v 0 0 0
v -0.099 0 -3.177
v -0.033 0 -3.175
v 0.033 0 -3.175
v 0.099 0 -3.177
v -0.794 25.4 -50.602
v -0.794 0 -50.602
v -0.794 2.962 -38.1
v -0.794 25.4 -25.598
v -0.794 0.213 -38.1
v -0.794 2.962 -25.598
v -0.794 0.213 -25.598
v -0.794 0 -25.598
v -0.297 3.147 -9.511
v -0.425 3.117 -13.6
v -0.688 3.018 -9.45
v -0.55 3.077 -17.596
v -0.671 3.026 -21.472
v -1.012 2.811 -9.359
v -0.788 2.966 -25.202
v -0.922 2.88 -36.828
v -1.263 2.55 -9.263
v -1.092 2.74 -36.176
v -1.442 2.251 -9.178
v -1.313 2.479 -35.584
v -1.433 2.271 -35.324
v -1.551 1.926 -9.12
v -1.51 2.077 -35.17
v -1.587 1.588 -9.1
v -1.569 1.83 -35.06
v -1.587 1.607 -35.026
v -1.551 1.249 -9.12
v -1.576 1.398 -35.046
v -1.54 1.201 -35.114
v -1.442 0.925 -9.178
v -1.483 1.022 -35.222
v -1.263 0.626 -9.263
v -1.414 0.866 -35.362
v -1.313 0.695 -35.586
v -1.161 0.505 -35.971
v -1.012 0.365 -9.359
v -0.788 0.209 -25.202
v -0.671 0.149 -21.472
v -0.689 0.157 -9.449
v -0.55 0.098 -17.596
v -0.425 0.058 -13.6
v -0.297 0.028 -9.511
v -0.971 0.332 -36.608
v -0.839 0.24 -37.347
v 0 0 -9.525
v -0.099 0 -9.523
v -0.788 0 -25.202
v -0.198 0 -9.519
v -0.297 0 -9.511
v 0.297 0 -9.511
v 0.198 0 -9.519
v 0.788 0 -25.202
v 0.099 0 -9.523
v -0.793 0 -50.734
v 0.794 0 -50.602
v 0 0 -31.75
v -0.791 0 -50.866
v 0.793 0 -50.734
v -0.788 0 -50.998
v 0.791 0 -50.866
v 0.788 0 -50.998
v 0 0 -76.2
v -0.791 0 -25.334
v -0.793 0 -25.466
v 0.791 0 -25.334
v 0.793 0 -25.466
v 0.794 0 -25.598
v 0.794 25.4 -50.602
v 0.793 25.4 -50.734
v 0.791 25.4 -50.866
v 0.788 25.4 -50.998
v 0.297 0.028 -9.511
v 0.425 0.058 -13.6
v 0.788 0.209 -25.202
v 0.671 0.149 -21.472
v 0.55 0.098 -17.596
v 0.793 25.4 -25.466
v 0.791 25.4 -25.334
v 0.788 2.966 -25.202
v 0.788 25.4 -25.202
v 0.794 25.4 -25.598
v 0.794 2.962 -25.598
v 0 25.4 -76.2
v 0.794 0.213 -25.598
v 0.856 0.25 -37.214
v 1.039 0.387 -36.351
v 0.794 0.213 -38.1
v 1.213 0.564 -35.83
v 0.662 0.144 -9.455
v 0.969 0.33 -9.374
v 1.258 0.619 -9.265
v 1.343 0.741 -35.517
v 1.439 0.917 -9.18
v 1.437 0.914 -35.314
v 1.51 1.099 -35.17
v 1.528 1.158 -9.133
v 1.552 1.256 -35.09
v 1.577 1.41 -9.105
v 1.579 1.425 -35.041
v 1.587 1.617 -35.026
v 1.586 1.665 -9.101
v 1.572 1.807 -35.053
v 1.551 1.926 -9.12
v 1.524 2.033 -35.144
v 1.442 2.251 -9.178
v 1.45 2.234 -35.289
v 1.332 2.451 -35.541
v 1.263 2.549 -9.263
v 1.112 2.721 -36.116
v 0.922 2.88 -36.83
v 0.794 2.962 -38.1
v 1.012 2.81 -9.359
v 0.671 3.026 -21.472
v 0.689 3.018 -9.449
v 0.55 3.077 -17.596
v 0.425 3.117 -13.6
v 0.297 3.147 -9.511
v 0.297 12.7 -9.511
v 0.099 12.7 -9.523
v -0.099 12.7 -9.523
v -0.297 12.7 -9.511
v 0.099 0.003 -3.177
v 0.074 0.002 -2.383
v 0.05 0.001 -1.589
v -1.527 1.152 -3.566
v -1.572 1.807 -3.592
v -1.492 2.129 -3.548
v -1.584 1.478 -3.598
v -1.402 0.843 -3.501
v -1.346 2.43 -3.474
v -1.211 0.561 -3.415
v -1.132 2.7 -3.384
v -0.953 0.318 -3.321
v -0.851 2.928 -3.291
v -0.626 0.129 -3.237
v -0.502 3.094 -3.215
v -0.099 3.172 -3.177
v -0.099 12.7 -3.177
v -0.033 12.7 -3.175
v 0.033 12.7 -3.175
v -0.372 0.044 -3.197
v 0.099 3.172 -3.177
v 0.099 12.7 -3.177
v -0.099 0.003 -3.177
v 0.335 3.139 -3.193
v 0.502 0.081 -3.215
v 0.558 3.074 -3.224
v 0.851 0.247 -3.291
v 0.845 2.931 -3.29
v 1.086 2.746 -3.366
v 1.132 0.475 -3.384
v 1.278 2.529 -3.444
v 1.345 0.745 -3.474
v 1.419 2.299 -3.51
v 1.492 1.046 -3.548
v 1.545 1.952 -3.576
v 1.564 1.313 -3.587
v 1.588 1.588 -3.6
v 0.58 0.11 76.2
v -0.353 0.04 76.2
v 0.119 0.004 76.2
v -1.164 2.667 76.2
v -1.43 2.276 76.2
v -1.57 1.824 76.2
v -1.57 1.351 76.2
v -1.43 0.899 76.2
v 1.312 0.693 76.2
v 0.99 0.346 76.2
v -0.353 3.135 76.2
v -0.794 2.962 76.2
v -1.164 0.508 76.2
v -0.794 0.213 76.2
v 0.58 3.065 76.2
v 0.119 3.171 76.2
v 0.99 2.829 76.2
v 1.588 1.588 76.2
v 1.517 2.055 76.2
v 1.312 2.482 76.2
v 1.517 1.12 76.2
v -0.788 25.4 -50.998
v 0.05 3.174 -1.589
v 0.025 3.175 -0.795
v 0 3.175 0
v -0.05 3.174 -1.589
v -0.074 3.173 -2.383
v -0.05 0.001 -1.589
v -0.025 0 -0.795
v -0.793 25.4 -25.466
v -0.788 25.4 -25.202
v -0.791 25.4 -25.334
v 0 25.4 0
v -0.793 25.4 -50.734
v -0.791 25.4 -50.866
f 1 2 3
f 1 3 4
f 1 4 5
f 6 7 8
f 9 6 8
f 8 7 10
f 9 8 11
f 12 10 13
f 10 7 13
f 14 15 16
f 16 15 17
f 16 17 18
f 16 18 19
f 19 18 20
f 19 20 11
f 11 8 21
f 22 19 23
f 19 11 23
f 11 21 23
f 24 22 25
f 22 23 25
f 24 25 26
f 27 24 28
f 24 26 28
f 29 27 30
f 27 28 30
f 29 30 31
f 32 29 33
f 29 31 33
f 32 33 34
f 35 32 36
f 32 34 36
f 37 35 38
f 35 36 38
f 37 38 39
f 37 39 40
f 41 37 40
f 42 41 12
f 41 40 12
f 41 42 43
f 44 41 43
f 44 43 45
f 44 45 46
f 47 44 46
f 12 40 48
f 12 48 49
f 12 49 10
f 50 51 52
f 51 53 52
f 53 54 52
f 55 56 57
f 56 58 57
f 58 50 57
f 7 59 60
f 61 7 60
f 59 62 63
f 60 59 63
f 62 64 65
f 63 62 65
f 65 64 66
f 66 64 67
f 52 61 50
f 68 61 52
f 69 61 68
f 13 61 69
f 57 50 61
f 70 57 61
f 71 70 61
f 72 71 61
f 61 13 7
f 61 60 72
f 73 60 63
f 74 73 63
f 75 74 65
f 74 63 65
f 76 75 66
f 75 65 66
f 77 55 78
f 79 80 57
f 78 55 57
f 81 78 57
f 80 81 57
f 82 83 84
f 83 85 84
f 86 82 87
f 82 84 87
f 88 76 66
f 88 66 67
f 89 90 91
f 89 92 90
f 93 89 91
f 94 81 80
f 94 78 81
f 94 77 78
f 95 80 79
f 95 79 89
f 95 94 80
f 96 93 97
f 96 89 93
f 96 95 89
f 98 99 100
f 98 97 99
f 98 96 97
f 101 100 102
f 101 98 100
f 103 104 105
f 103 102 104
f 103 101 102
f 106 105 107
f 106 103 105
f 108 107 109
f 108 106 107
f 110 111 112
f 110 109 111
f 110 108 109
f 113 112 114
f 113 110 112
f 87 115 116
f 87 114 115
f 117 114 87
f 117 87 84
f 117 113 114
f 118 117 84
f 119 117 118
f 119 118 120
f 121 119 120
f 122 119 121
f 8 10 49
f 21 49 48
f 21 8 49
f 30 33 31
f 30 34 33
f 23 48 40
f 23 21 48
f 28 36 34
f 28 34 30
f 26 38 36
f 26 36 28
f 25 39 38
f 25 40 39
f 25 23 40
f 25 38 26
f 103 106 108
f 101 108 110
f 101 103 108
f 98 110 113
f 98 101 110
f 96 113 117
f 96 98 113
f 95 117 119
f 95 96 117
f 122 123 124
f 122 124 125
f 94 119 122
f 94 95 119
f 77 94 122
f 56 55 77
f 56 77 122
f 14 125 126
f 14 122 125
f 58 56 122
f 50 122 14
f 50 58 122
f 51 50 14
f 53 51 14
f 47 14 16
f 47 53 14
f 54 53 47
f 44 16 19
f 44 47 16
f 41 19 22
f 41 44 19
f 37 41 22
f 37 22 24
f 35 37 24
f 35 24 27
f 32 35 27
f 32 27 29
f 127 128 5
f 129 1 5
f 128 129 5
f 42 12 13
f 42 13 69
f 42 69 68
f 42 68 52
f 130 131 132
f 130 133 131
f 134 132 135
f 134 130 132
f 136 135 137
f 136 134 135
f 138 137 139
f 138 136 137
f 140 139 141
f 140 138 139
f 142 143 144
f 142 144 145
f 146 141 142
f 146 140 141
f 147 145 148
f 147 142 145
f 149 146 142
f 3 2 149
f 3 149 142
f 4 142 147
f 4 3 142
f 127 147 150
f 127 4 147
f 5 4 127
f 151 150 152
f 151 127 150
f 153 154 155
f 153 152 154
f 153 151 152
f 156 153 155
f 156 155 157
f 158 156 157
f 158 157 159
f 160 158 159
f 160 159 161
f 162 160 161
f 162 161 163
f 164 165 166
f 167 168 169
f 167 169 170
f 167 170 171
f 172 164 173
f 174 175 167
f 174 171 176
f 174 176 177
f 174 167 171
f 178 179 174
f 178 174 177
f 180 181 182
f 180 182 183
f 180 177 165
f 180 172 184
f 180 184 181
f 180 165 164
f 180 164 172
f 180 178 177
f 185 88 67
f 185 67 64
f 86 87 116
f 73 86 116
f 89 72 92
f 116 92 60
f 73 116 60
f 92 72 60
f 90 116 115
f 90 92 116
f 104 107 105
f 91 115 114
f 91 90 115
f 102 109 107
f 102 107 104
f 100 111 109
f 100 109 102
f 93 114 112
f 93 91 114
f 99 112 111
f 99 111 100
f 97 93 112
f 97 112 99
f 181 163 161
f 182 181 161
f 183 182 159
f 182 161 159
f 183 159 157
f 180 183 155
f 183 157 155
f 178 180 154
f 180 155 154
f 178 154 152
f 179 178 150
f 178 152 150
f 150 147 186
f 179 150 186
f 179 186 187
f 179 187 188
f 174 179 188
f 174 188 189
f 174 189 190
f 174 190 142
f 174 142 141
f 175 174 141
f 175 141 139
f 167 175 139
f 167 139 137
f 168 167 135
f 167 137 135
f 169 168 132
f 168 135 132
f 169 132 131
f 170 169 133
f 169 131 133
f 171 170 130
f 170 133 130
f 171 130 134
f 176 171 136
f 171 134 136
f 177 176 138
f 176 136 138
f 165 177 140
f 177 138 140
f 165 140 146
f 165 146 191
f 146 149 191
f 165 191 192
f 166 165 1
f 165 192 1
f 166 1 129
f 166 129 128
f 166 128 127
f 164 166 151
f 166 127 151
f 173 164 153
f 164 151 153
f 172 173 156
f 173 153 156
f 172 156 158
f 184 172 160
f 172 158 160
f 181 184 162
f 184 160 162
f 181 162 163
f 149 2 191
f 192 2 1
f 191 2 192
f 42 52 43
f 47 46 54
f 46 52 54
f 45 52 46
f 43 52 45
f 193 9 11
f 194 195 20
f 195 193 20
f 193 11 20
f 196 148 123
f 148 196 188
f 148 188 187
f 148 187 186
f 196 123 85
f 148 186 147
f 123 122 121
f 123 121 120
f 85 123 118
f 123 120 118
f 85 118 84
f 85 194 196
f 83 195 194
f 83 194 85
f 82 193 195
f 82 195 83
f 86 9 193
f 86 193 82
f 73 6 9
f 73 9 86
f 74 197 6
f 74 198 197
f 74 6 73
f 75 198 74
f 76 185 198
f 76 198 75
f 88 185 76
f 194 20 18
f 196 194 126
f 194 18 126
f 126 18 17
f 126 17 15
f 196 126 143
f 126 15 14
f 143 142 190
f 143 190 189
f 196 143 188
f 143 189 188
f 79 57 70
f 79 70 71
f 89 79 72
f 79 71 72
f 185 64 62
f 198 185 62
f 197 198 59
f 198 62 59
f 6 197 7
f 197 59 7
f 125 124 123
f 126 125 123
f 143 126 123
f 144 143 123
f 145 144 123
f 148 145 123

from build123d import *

# Parameters (mm, degrees)
BOSS_EXTRUDE1_DEPTH      = 25.4
FILLET1_R                = 12.7
BOSS_EXTRUDE2_DEPTH      = 76.2
BOSS_EXTRUDE2_DEPTH_BACK = 31.75
SKETCH3_R                = 1.5875
FILLET2_R                = 6.35
SKETCH4_R                = 3.175
CUT_EXTRUDE2_DEPTH       = 12.7


with BuildPart() as part:
    # Sketch1 → Boss-Extrude1 (new body)
    with BuildSketch(Plane(origin=(0, 0, 0), x_dir=(1, 0, 0), z_dir=(0, 1, 0))):
        Polygon((-0.79375, 50.8), (-0.79375, 25.4), (0, 0), (0.79375, 25.4), (0.79375, 50.8), (0, 76.2), align=None)
    extrude(amount=BOSS_EXTRUDE1_DEPTH)

    # Fillet1
    # the kernel refuses this fillet: 12.7 mm, written as the material it takes off along each edge
    with BuildSketch(Plane(origin=(-0.79375, -0.495972692, -25.4), x_dir=(0, 0, -1), z_dir=(0, 1, 0)), Plane(origin=(0.79375, -0.495972692, -50.8), x_dir=(0, 0, 1), z_dir=(0, 1, 0)), Plane(origin=(0.79375, -0.495972692, -25.4), x_dir=(-0.031234752377718417, 0, 0.9995120760870789), z_dir=(0, 1, 0))) as fillet1_piece_1:
        with BuildLine():
            CenterArc((FILLET1_R * 0.0156211871642, -FILLET1_R), FILLET1_R, 90, 1.789910608)
            Line((-FILLET1_R * 0.0156135652135, -FILLET1_R * 0.000487923912921), (0, 0))
            Line((0, 0), (FILLET1_R * 0.0156211871642, 0))
        make_face()
    extrude(amount=26.391945385, mode=Mode.SUBTRACT)
    with BuildSketch(Plane(origin=(-0.79375, -0.495972692, -50.8), x_dir=(0, 0, 1), z_dir=(0, 1, 0))) as fillet1_piece_2:
        with BuildLine():
            CenterArc((FILLET1_R * 0.0156211871642, FILLET1_R), FILLET1_R, 268.210089392, 1.789910608)
            Line((-FILLET1_R * 0.0156135652135, FILLET1_R * 0.000487923912921), (0, 0))
            Line((0, 0), (FILLET1_R * 0.0156211871642, 0))
        make_face()
    extrude(amount=26.391945385, mode=Mode.SUBTRACT)

    # Sketch3 → Boss-Extrude2 (add, two sides: drawn at the far end of the back side and taken through both)
    with BuildSketch(Plane.XY.offset(-BOSS_EXTRUDE2_DEPTH_BACK)):
        with Locations((0, 1.5875)):
            Circle(SKETCH3_R)
    extrude(amount=BOSS_EXTRUDE2_DEPTH + BOSS_EXTRUDE2_DEPTH_BACK)

    # Fillet2
    # the kernel refuses this fillet: 6.35 mm, written as the material it adds along each edge
    with BuildSketch(Plane(origin=(-0.79375, 18.837315329, -31.75), x_dir=(0, 0, -1), z_dir=(0, -1, 0))) as fillet2_piece_1_section:
        with BuildLine():
            CenterArc((FILLET2_R, -FILLET2_R), FILLET2_R, 90, 90)
            Line((0, -FILLET2_R), (0, 0))
            Line((0, 0), (FILLET2_R, 0))
        make_face()
    fillet2_piece_1 = extrude(amount=34.499630657, mode=Mode.PRIVATE)
    fillet2_piece_1 = fillet2_piece_1 & Plane(origin=(0, 1.5875, -34.046856279), x_dir=(1, 0, 0), z_dir=(0, 0, 1)) * Cylinder(1.5875, 95, mode=Mode.PRIVATE)
    add(fillet2_piece_1)
    with BuildSketch(Plane(origin=(0.79375, -15.662315329, -31.75), x_dir=(0, 0, -1), z_dir=(0, 1, 0))) as fillet2_piece_2_section:
        with BuildLine():
            CenterArc((FILLET2_R, -FILLET2_R), FILLET2_R, 90, 90)
            Line((0, -FILLET2_R), (0, 0))
            Line((0, 0), (FILLET2_R, 0))
        make_face()
    fillet2_piece_2 = extrude(amount=34.499630657, mode=Mode.PRIVATE)
    fillet2_piece_2 = fillet2_piece_2 & Plane(origin=(0, 1.5875, -34.046857324), x_dir=(1, 0, 0), z_dir=(0, 0, 1)) * Cylinder(1.5875, 95, mode=Mode.PRIVATE)
    add(fillet2_piece_2)

    # Sketch4 → Cut-Extrude2 (cut)
    with BuildSketch(Plane(origin=(0, 0, 0), x_dir=(1, 0, 0), z_dir=(0, 1, 0))):
        with Locations((0, 6.35)):
            Circle(SKETCH4_R)
    extrude(amount=CUT_EXTRUDE2_DEPTH, mode=Mode.SUBTRACT)


solid = part.part
